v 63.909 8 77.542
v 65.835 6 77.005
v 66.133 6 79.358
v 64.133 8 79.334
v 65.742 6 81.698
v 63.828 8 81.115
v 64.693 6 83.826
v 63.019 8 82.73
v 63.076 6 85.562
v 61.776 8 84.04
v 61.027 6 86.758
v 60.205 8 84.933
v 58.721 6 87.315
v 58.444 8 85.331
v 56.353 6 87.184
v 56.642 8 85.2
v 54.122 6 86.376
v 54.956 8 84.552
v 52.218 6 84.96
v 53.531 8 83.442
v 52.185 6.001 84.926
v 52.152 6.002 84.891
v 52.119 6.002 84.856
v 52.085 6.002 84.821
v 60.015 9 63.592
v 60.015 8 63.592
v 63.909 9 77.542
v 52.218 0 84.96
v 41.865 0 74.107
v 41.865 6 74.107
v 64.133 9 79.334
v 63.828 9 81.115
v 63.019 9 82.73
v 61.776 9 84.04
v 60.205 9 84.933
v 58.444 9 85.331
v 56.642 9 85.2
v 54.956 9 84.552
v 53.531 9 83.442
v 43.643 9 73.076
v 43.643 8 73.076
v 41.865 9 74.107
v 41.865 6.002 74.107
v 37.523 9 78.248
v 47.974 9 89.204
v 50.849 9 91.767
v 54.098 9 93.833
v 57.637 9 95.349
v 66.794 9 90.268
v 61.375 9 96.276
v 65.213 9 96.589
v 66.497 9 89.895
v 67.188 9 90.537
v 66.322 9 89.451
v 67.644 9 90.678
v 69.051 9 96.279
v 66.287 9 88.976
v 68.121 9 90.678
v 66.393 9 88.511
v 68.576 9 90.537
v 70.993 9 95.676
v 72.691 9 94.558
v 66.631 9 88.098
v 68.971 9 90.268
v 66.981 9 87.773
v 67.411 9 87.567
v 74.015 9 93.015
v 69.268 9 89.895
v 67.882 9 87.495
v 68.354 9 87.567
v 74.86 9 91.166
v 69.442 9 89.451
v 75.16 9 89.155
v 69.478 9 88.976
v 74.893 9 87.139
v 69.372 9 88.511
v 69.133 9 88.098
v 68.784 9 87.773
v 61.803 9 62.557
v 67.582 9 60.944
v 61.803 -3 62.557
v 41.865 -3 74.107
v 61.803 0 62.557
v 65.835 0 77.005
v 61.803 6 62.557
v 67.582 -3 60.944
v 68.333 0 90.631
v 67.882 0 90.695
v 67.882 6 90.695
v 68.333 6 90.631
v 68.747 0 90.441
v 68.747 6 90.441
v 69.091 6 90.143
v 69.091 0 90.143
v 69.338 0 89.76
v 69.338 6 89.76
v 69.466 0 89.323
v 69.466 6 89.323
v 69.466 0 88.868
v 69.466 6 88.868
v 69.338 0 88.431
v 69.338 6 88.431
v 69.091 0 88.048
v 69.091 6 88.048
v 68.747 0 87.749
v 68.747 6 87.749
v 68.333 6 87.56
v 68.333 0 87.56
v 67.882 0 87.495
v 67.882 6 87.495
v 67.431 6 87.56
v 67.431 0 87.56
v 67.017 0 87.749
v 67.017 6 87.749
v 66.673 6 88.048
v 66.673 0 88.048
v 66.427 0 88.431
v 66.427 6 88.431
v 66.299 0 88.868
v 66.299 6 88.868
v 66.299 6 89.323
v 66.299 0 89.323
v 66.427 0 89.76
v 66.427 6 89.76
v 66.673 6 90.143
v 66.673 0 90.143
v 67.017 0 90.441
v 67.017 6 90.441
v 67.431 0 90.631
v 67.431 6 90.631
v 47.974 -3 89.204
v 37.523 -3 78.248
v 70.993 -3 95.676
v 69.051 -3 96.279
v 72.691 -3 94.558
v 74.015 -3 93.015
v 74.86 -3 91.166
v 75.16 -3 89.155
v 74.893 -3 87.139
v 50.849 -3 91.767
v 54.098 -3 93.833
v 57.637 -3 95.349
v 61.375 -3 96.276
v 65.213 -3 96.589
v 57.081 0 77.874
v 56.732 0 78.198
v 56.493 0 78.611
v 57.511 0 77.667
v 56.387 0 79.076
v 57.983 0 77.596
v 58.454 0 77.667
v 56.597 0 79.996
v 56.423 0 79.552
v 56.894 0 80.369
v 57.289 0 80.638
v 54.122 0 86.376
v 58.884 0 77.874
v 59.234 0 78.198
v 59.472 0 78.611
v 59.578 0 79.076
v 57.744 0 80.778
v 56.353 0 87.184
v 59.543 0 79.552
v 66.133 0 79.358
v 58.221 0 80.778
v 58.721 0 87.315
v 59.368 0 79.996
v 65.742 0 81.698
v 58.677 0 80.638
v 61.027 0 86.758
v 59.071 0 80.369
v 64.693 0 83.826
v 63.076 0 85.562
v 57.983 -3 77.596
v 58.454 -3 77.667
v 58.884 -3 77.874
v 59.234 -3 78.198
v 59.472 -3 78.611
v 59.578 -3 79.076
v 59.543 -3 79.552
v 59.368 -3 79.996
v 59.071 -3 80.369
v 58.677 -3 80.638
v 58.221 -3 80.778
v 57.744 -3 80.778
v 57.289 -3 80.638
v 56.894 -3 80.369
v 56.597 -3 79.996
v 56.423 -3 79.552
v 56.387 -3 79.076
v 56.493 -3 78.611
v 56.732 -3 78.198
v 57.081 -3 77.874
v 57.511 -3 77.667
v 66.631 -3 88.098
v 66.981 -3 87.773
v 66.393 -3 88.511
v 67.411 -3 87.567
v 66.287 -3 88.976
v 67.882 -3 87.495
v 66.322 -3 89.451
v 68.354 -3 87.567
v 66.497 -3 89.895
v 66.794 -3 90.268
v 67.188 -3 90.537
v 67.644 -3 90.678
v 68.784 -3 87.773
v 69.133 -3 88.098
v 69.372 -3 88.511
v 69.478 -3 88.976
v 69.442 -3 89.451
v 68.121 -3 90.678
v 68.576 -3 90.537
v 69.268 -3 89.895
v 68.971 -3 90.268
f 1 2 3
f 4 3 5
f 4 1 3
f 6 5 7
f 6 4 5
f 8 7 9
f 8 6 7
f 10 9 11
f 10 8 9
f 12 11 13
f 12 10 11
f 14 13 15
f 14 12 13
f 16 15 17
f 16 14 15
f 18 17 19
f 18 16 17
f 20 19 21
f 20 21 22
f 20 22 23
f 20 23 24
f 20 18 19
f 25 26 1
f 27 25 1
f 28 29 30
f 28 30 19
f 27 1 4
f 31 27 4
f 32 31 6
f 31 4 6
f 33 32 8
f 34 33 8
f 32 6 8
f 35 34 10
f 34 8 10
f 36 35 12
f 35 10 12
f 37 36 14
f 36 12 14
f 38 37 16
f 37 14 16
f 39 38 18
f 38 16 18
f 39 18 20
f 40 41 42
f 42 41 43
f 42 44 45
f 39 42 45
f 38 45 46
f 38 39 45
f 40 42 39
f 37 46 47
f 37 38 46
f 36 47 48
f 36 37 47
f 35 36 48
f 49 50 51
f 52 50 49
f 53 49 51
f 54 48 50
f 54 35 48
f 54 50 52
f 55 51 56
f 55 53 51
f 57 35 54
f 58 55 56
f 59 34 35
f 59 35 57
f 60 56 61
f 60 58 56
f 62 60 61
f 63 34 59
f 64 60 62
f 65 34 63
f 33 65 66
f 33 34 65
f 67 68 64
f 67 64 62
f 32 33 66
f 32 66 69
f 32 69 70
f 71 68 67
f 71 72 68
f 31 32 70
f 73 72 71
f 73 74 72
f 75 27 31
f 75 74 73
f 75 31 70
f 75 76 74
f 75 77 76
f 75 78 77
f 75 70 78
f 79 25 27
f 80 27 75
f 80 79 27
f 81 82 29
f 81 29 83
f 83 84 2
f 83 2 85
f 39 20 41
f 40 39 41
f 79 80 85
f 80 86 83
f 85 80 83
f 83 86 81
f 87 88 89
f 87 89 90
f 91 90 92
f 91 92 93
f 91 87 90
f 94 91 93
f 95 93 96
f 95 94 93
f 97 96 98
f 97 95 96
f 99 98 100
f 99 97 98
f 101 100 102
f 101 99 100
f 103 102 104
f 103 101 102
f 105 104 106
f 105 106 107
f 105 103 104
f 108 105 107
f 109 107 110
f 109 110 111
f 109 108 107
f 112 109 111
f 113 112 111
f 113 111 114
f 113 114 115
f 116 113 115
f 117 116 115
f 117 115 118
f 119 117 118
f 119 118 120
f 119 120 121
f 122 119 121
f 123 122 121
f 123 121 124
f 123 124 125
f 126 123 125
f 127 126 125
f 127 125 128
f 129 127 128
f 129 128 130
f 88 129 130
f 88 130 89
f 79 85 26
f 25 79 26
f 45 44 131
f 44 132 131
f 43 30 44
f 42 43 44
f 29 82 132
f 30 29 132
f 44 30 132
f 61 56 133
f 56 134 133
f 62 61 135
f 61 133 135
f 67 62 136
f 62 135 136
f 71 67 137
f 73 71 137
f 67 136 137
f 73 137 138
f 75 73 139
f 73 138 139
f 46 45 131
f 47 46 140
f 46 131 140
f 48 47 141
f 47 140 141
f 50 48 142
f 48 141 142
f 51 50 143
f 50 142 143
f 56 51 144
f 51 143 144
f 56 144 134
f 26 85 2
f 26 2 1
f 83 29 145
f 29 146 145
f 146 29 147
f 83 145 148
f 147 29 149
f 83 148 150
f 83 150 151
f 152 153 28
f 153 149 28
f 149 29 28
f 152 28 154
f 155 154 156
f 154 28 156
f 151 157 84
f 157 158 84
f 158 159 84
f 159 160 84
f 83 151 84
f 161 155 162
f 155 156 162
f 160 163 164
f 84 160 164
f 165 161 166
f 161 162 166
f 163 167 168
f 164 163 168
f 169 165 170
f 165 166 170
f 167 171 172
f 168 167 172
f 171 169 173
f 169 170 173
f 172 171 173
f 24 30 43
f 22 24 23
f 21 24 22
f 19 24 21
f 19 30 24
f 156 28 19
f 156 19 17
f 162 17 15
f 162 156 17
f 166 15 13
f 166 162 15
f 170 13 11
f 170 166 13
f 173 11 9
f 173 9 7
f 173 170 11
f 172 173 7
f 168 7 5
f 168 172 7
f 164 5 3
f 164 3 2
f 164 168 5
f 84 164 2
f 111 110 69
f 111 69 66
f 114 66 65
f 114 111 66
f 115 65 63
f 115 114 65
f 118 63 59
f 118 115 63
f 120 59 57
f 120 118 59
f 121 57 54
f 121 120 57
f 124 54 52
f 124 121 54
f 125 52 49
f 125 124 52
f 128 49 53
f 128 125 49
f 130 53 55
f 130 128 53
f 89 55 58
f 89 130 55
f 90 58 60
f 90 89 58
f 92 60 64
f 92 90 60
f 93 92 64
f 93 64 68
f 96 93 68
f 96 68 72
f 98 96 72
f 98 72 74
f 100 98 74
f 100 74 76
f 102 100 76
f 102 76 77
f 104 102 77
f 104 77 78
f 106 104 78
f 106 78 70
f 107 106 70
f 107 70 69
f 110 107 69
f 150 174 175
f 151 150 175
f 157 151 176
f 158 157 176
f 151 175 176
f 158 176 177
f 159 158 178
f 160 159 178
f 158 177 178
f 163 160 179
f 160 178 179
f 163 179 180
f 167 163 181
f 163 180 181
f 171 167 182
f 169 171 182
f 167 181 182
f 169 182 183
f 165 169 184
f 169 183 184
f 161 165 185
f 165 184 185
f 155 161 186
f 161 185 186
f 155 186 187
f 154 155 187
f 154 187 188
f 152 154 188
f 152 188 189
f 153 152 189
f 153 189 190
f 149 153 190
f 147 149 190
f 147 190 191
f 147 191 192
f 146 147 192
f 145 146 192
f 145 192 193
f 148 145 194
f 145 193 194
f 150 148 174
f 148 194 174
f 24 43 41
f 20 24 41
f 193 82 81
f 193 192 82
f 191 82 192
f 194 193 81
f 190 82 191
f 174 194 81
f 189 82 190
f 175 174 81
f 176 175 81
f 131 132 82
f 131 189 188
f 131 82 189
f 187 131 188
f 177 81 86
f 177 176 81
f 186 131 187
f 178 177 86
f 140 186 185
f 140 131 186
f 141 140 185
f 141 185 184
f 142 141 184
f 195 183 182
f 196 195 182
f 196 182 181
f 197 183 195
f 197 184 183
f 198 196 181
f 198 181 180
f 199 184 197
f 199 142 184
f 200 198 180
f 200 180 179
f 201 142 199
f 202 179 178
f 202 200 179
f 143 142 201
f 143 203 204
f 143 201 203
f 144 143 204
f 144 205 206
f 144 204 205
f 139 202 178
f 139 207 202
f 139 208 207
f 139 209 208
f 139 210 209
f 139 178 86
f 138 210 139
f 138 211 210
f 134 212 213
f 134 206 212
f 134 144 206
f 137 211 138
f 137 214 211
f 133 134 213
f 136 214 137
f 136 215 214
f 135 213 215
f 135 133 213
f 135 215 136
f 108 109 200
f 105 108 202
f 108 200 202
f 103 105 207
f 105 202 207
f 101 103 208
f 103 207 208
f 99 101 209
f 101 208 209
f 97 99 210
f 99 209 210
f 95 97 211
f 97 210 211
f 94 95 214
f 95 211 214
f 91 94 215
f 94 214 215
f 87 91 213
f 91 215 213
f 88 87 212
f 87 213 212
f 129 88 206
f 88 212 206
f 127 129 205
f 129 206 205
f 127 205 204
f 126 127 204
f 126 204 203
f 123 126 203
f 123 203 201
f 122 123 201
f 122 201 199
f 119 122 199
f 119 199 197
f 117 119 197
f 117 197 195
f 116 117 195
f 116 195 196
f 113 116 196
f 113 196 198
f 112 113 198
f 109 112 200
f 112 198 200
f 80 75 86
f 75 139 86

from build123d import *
from build123d.topology import SkipClean

# Parameters (mm, degrees)
SKETCH1_R           = 1.6
BOSS_EXTRUDE1_DEPTH = 6
BOSS_EXTRUDE3_START = 3
SKETCH7_R           = 1.6
BOSS_EXTRUDE3_DEPTH = 3
SKETCH8_R           = 1.6
BOSS_EXTRUDE4_DEPTH = 3
CHAMFER1_SIZE       = 2


with BuildPart() as part:
    # Sketch1 → Boss-Extrude1 (new body)
    with BuildSketch(Plane(origin=(0, 0, 0), x_dir=(1, 0, 0), z_dir=(0, 1, 0))):
        with BuildLine():
            Line((41.864892623, -74.106527494), (52.218230336, -84.960485214))
            ThreePointArc((52.218230336, -84.960485214), (62.095402371, -86.234826865), (65.834966495, -77.004543326))
            Line((65.834966495, -77.004543326), (61.8028085, -62.55664722))
            Line((61.8028085, -62.55664722), (67.581966942, -60.943784022))
            Line((67.581966942, -60.943784022), (74.892595581, -87.138988466))
            ThreePointArc((74.892595581, -87.138988466), (74.014994187, -93.014912457), (69.051034467, -96.279230281))
            ThreePointArc((69.051034467, -96.279230281), (57.637399431, -95.34940583), (47.97440772, -89.204307831))
            Line((47.97440772, -89.204307831), (37.523309535, -78.247862579))
            Line((37.523309535, -78.247862579), (41.864892623, -74.106527494))
        make_face()
        with Locations(Location((67.882250994, -89.09545443, 0), (0, 0, 270))):
            Circle(SKETCH1_R, mode=Mode.SUBTRACT)
    extrude(amount=BOSS_EXTRUDE1_DEPTH)

    # Sketch7 → Boss-Extrude3 (add)
    with SkipClean():  # the faces are left unmerged after this step: merging them gives an invalid solid
        with BuildSketch(Plane.XZ.offset(BOSS_EXTRUDE3_START)):
            with BuildLine():
                Line((37.523309535, 78.247862579), (41.864892623, 74.106527494))
                Line((41.864892623, 74.106527494), (61.8028085, 62.55664722))
                Line((61.8028085, 62.55664722), (67.581966942, 60.943784022))
                Line((67.581966942, 60.943784022), (74.892595581, 87.138988466))
                ThreePointArc((74.892595581, 87.138988466), (74.014994187, 93.014912457), (69.051034467, 96.279230281))
                ThreePointArc((69.051034467, 96.279230281), (57.637399431, 95.34940583), (47.97440772, 89.204307831))
                Line((47.97440772, 89.204307831), (37.523309535, 78.247862579))
            make_face()
            with Locations(Location((67.882250994, 89.09545443, 0), (0, 0, 270))):
                Circle(SKETCH7_R, mode=Mode.SUBTRACT)
            with Locations(Location((57.982756057, 79.195959493, 0), (0, 0, 270))):
                Circle(SKETCH7_R, mode=Mode.SUBTRACT)
        extrude(amount=-BOSS_EXTRUDE3_DEPTH)

    # Sketch8 → Boss-Extrude4 (add)
    with BuildSketch(Plane(origin=(0, 6, 0), x_dir=(1, 0, 0), z_dir=(0, 1, 0))):
        with BuildLine():
            Line((41.864892623, -74.106527494), (37.523309535, -78.247862579))
            Line((37.523309535, -78.247862579), (47.97440772, -89.204307831))
            ThreePointArc((47.97440772, -89.204307831), (57.637399431, -95.34940583), (69.051034467, -96.279230281))
            ThreePointArc((69.051034467, -96.279230281), (74.014994187, -93.014912457), (74.892595581, -87.138988466))
            Line((74.892595581, -87.138988466), (67.581966942, -60.943784022))
            Line((67.581966942, -60.943784022), (61.8028085, -62.55664722))
            Line((61.8028085, -62.55664722), (60.015359325, -63.592102685))
            Line((60.015359325, -63.592102685), (63.908580348, -77.542164392))
            ThreePointArc((63.908580348, -77.542164392), (61.023544246, -84.544233882), (53.530990497, -83.442395075))
            Line((53.530990497, -83.442395075), (43.643121603, -73.076413215))
            Line((43.643121603, -73.076413215), (41.864892623, -74.106527494))
        make_face()
        with Locations(Location((67.882250994, -89.09545443, 0), (0, 0, 90))):
            Circle(SKETCH8_R, mode=Mode.SUBTRACT)
    extrude(amount=BOSS_EXTRUDE4_DEPTH)

    # Chamfer1
    # the kernel refuses this chamfer: 2 mm, written as the material it takes off along each edge
    with BuildSketch(Plane(origin=(53.530990497, 6, 83.442395075), x_dir=(-0.7233236015009538, -0.02749587661058648, 0.689961552755735), z_dir=(-0.6902225142158023, 0, -0.7235971813582588))) as chamfer1_piece_1_section:
        Polygon((CHAMFER1_SIZE * 0.999621916911, CHAMFER1_SIZE * 0.0274958766106), (-CHAMFER1_SIZE * 0.0274958766106, CHAMFER1_SIZE * 0.999621916911), (0, 0), align=None)
    chamfer1_piece_1 = extrude(amount=19.468990959, mode=Mode.PRIVATE)
    chamfer1_piece_1 = split(chamfer1_piece_1, bisect_by=Plane(origin=(47.085687298, 6.664817027, 79.579765809), z_dir=(0.7235971813582587, 0, -0.6902225142158024)), keep=Keep.TOP, mode=Mode.PRIVATE)
    add(chamfer1_piece_1, mode=Mode.SUBTRACT)
    with BuildSketch(Plane(origin=(57.982756057, 6, 79.195959493), x_dir=(0.9631930737538318, 0, -0.26881053303887753), z_dir=(-0.26881053303887753, 0, -0.9631930737538318))) as chamfer1_piece_2_section:
        Polygon((6.152270455 + CHAMFER1_SIZE, 0), (6.152270455, -CHAMFER1_SIZE), (6.152270455, 0), align=None)
    chamfer1_piece_2 = revolve(axis=Axis((57.982756057, 6, 79.195959493), (0, -1, 0)), revolution_arc=151.945773521, mode=Mode.PRIVATE)
    chamfer1_piece_2 = split(chamfer1_piece_2, bisect_by=Plane(origin=(55.289387778, 6.562492794, 88.180143835), z_dir=(0.7235971813582587, 0, -0.6902225142158024)), keep=Keep.TOP, mode=Mode.PRIVATE)
    add(chamfer1_piece_2, mode=Mode.SUBTRACT)
    with BuildSketch(Plane(origin=(58.632768376, 6, 58.638048201), x_dir=(0.9628289067414894, -0.027495876610586514, -0.26870890032227024), z_dir=(0.2688105330388776, 0, 0.9631930737538319))) as chamfer1_piece_3:
        Polygon((CHAMFER1_SIZE * 0.999621916911, CHAMFER1_SIZE * 0.0274958766106), (-CHAMFER1_SIZE * 0.0274958766106, CHAMFER1_SIZE * 0.999621916911), (0, 0), align=None)
    extrude(amount=19.626507609, mode=Mode.SUBTRACT)


solid = part.part
